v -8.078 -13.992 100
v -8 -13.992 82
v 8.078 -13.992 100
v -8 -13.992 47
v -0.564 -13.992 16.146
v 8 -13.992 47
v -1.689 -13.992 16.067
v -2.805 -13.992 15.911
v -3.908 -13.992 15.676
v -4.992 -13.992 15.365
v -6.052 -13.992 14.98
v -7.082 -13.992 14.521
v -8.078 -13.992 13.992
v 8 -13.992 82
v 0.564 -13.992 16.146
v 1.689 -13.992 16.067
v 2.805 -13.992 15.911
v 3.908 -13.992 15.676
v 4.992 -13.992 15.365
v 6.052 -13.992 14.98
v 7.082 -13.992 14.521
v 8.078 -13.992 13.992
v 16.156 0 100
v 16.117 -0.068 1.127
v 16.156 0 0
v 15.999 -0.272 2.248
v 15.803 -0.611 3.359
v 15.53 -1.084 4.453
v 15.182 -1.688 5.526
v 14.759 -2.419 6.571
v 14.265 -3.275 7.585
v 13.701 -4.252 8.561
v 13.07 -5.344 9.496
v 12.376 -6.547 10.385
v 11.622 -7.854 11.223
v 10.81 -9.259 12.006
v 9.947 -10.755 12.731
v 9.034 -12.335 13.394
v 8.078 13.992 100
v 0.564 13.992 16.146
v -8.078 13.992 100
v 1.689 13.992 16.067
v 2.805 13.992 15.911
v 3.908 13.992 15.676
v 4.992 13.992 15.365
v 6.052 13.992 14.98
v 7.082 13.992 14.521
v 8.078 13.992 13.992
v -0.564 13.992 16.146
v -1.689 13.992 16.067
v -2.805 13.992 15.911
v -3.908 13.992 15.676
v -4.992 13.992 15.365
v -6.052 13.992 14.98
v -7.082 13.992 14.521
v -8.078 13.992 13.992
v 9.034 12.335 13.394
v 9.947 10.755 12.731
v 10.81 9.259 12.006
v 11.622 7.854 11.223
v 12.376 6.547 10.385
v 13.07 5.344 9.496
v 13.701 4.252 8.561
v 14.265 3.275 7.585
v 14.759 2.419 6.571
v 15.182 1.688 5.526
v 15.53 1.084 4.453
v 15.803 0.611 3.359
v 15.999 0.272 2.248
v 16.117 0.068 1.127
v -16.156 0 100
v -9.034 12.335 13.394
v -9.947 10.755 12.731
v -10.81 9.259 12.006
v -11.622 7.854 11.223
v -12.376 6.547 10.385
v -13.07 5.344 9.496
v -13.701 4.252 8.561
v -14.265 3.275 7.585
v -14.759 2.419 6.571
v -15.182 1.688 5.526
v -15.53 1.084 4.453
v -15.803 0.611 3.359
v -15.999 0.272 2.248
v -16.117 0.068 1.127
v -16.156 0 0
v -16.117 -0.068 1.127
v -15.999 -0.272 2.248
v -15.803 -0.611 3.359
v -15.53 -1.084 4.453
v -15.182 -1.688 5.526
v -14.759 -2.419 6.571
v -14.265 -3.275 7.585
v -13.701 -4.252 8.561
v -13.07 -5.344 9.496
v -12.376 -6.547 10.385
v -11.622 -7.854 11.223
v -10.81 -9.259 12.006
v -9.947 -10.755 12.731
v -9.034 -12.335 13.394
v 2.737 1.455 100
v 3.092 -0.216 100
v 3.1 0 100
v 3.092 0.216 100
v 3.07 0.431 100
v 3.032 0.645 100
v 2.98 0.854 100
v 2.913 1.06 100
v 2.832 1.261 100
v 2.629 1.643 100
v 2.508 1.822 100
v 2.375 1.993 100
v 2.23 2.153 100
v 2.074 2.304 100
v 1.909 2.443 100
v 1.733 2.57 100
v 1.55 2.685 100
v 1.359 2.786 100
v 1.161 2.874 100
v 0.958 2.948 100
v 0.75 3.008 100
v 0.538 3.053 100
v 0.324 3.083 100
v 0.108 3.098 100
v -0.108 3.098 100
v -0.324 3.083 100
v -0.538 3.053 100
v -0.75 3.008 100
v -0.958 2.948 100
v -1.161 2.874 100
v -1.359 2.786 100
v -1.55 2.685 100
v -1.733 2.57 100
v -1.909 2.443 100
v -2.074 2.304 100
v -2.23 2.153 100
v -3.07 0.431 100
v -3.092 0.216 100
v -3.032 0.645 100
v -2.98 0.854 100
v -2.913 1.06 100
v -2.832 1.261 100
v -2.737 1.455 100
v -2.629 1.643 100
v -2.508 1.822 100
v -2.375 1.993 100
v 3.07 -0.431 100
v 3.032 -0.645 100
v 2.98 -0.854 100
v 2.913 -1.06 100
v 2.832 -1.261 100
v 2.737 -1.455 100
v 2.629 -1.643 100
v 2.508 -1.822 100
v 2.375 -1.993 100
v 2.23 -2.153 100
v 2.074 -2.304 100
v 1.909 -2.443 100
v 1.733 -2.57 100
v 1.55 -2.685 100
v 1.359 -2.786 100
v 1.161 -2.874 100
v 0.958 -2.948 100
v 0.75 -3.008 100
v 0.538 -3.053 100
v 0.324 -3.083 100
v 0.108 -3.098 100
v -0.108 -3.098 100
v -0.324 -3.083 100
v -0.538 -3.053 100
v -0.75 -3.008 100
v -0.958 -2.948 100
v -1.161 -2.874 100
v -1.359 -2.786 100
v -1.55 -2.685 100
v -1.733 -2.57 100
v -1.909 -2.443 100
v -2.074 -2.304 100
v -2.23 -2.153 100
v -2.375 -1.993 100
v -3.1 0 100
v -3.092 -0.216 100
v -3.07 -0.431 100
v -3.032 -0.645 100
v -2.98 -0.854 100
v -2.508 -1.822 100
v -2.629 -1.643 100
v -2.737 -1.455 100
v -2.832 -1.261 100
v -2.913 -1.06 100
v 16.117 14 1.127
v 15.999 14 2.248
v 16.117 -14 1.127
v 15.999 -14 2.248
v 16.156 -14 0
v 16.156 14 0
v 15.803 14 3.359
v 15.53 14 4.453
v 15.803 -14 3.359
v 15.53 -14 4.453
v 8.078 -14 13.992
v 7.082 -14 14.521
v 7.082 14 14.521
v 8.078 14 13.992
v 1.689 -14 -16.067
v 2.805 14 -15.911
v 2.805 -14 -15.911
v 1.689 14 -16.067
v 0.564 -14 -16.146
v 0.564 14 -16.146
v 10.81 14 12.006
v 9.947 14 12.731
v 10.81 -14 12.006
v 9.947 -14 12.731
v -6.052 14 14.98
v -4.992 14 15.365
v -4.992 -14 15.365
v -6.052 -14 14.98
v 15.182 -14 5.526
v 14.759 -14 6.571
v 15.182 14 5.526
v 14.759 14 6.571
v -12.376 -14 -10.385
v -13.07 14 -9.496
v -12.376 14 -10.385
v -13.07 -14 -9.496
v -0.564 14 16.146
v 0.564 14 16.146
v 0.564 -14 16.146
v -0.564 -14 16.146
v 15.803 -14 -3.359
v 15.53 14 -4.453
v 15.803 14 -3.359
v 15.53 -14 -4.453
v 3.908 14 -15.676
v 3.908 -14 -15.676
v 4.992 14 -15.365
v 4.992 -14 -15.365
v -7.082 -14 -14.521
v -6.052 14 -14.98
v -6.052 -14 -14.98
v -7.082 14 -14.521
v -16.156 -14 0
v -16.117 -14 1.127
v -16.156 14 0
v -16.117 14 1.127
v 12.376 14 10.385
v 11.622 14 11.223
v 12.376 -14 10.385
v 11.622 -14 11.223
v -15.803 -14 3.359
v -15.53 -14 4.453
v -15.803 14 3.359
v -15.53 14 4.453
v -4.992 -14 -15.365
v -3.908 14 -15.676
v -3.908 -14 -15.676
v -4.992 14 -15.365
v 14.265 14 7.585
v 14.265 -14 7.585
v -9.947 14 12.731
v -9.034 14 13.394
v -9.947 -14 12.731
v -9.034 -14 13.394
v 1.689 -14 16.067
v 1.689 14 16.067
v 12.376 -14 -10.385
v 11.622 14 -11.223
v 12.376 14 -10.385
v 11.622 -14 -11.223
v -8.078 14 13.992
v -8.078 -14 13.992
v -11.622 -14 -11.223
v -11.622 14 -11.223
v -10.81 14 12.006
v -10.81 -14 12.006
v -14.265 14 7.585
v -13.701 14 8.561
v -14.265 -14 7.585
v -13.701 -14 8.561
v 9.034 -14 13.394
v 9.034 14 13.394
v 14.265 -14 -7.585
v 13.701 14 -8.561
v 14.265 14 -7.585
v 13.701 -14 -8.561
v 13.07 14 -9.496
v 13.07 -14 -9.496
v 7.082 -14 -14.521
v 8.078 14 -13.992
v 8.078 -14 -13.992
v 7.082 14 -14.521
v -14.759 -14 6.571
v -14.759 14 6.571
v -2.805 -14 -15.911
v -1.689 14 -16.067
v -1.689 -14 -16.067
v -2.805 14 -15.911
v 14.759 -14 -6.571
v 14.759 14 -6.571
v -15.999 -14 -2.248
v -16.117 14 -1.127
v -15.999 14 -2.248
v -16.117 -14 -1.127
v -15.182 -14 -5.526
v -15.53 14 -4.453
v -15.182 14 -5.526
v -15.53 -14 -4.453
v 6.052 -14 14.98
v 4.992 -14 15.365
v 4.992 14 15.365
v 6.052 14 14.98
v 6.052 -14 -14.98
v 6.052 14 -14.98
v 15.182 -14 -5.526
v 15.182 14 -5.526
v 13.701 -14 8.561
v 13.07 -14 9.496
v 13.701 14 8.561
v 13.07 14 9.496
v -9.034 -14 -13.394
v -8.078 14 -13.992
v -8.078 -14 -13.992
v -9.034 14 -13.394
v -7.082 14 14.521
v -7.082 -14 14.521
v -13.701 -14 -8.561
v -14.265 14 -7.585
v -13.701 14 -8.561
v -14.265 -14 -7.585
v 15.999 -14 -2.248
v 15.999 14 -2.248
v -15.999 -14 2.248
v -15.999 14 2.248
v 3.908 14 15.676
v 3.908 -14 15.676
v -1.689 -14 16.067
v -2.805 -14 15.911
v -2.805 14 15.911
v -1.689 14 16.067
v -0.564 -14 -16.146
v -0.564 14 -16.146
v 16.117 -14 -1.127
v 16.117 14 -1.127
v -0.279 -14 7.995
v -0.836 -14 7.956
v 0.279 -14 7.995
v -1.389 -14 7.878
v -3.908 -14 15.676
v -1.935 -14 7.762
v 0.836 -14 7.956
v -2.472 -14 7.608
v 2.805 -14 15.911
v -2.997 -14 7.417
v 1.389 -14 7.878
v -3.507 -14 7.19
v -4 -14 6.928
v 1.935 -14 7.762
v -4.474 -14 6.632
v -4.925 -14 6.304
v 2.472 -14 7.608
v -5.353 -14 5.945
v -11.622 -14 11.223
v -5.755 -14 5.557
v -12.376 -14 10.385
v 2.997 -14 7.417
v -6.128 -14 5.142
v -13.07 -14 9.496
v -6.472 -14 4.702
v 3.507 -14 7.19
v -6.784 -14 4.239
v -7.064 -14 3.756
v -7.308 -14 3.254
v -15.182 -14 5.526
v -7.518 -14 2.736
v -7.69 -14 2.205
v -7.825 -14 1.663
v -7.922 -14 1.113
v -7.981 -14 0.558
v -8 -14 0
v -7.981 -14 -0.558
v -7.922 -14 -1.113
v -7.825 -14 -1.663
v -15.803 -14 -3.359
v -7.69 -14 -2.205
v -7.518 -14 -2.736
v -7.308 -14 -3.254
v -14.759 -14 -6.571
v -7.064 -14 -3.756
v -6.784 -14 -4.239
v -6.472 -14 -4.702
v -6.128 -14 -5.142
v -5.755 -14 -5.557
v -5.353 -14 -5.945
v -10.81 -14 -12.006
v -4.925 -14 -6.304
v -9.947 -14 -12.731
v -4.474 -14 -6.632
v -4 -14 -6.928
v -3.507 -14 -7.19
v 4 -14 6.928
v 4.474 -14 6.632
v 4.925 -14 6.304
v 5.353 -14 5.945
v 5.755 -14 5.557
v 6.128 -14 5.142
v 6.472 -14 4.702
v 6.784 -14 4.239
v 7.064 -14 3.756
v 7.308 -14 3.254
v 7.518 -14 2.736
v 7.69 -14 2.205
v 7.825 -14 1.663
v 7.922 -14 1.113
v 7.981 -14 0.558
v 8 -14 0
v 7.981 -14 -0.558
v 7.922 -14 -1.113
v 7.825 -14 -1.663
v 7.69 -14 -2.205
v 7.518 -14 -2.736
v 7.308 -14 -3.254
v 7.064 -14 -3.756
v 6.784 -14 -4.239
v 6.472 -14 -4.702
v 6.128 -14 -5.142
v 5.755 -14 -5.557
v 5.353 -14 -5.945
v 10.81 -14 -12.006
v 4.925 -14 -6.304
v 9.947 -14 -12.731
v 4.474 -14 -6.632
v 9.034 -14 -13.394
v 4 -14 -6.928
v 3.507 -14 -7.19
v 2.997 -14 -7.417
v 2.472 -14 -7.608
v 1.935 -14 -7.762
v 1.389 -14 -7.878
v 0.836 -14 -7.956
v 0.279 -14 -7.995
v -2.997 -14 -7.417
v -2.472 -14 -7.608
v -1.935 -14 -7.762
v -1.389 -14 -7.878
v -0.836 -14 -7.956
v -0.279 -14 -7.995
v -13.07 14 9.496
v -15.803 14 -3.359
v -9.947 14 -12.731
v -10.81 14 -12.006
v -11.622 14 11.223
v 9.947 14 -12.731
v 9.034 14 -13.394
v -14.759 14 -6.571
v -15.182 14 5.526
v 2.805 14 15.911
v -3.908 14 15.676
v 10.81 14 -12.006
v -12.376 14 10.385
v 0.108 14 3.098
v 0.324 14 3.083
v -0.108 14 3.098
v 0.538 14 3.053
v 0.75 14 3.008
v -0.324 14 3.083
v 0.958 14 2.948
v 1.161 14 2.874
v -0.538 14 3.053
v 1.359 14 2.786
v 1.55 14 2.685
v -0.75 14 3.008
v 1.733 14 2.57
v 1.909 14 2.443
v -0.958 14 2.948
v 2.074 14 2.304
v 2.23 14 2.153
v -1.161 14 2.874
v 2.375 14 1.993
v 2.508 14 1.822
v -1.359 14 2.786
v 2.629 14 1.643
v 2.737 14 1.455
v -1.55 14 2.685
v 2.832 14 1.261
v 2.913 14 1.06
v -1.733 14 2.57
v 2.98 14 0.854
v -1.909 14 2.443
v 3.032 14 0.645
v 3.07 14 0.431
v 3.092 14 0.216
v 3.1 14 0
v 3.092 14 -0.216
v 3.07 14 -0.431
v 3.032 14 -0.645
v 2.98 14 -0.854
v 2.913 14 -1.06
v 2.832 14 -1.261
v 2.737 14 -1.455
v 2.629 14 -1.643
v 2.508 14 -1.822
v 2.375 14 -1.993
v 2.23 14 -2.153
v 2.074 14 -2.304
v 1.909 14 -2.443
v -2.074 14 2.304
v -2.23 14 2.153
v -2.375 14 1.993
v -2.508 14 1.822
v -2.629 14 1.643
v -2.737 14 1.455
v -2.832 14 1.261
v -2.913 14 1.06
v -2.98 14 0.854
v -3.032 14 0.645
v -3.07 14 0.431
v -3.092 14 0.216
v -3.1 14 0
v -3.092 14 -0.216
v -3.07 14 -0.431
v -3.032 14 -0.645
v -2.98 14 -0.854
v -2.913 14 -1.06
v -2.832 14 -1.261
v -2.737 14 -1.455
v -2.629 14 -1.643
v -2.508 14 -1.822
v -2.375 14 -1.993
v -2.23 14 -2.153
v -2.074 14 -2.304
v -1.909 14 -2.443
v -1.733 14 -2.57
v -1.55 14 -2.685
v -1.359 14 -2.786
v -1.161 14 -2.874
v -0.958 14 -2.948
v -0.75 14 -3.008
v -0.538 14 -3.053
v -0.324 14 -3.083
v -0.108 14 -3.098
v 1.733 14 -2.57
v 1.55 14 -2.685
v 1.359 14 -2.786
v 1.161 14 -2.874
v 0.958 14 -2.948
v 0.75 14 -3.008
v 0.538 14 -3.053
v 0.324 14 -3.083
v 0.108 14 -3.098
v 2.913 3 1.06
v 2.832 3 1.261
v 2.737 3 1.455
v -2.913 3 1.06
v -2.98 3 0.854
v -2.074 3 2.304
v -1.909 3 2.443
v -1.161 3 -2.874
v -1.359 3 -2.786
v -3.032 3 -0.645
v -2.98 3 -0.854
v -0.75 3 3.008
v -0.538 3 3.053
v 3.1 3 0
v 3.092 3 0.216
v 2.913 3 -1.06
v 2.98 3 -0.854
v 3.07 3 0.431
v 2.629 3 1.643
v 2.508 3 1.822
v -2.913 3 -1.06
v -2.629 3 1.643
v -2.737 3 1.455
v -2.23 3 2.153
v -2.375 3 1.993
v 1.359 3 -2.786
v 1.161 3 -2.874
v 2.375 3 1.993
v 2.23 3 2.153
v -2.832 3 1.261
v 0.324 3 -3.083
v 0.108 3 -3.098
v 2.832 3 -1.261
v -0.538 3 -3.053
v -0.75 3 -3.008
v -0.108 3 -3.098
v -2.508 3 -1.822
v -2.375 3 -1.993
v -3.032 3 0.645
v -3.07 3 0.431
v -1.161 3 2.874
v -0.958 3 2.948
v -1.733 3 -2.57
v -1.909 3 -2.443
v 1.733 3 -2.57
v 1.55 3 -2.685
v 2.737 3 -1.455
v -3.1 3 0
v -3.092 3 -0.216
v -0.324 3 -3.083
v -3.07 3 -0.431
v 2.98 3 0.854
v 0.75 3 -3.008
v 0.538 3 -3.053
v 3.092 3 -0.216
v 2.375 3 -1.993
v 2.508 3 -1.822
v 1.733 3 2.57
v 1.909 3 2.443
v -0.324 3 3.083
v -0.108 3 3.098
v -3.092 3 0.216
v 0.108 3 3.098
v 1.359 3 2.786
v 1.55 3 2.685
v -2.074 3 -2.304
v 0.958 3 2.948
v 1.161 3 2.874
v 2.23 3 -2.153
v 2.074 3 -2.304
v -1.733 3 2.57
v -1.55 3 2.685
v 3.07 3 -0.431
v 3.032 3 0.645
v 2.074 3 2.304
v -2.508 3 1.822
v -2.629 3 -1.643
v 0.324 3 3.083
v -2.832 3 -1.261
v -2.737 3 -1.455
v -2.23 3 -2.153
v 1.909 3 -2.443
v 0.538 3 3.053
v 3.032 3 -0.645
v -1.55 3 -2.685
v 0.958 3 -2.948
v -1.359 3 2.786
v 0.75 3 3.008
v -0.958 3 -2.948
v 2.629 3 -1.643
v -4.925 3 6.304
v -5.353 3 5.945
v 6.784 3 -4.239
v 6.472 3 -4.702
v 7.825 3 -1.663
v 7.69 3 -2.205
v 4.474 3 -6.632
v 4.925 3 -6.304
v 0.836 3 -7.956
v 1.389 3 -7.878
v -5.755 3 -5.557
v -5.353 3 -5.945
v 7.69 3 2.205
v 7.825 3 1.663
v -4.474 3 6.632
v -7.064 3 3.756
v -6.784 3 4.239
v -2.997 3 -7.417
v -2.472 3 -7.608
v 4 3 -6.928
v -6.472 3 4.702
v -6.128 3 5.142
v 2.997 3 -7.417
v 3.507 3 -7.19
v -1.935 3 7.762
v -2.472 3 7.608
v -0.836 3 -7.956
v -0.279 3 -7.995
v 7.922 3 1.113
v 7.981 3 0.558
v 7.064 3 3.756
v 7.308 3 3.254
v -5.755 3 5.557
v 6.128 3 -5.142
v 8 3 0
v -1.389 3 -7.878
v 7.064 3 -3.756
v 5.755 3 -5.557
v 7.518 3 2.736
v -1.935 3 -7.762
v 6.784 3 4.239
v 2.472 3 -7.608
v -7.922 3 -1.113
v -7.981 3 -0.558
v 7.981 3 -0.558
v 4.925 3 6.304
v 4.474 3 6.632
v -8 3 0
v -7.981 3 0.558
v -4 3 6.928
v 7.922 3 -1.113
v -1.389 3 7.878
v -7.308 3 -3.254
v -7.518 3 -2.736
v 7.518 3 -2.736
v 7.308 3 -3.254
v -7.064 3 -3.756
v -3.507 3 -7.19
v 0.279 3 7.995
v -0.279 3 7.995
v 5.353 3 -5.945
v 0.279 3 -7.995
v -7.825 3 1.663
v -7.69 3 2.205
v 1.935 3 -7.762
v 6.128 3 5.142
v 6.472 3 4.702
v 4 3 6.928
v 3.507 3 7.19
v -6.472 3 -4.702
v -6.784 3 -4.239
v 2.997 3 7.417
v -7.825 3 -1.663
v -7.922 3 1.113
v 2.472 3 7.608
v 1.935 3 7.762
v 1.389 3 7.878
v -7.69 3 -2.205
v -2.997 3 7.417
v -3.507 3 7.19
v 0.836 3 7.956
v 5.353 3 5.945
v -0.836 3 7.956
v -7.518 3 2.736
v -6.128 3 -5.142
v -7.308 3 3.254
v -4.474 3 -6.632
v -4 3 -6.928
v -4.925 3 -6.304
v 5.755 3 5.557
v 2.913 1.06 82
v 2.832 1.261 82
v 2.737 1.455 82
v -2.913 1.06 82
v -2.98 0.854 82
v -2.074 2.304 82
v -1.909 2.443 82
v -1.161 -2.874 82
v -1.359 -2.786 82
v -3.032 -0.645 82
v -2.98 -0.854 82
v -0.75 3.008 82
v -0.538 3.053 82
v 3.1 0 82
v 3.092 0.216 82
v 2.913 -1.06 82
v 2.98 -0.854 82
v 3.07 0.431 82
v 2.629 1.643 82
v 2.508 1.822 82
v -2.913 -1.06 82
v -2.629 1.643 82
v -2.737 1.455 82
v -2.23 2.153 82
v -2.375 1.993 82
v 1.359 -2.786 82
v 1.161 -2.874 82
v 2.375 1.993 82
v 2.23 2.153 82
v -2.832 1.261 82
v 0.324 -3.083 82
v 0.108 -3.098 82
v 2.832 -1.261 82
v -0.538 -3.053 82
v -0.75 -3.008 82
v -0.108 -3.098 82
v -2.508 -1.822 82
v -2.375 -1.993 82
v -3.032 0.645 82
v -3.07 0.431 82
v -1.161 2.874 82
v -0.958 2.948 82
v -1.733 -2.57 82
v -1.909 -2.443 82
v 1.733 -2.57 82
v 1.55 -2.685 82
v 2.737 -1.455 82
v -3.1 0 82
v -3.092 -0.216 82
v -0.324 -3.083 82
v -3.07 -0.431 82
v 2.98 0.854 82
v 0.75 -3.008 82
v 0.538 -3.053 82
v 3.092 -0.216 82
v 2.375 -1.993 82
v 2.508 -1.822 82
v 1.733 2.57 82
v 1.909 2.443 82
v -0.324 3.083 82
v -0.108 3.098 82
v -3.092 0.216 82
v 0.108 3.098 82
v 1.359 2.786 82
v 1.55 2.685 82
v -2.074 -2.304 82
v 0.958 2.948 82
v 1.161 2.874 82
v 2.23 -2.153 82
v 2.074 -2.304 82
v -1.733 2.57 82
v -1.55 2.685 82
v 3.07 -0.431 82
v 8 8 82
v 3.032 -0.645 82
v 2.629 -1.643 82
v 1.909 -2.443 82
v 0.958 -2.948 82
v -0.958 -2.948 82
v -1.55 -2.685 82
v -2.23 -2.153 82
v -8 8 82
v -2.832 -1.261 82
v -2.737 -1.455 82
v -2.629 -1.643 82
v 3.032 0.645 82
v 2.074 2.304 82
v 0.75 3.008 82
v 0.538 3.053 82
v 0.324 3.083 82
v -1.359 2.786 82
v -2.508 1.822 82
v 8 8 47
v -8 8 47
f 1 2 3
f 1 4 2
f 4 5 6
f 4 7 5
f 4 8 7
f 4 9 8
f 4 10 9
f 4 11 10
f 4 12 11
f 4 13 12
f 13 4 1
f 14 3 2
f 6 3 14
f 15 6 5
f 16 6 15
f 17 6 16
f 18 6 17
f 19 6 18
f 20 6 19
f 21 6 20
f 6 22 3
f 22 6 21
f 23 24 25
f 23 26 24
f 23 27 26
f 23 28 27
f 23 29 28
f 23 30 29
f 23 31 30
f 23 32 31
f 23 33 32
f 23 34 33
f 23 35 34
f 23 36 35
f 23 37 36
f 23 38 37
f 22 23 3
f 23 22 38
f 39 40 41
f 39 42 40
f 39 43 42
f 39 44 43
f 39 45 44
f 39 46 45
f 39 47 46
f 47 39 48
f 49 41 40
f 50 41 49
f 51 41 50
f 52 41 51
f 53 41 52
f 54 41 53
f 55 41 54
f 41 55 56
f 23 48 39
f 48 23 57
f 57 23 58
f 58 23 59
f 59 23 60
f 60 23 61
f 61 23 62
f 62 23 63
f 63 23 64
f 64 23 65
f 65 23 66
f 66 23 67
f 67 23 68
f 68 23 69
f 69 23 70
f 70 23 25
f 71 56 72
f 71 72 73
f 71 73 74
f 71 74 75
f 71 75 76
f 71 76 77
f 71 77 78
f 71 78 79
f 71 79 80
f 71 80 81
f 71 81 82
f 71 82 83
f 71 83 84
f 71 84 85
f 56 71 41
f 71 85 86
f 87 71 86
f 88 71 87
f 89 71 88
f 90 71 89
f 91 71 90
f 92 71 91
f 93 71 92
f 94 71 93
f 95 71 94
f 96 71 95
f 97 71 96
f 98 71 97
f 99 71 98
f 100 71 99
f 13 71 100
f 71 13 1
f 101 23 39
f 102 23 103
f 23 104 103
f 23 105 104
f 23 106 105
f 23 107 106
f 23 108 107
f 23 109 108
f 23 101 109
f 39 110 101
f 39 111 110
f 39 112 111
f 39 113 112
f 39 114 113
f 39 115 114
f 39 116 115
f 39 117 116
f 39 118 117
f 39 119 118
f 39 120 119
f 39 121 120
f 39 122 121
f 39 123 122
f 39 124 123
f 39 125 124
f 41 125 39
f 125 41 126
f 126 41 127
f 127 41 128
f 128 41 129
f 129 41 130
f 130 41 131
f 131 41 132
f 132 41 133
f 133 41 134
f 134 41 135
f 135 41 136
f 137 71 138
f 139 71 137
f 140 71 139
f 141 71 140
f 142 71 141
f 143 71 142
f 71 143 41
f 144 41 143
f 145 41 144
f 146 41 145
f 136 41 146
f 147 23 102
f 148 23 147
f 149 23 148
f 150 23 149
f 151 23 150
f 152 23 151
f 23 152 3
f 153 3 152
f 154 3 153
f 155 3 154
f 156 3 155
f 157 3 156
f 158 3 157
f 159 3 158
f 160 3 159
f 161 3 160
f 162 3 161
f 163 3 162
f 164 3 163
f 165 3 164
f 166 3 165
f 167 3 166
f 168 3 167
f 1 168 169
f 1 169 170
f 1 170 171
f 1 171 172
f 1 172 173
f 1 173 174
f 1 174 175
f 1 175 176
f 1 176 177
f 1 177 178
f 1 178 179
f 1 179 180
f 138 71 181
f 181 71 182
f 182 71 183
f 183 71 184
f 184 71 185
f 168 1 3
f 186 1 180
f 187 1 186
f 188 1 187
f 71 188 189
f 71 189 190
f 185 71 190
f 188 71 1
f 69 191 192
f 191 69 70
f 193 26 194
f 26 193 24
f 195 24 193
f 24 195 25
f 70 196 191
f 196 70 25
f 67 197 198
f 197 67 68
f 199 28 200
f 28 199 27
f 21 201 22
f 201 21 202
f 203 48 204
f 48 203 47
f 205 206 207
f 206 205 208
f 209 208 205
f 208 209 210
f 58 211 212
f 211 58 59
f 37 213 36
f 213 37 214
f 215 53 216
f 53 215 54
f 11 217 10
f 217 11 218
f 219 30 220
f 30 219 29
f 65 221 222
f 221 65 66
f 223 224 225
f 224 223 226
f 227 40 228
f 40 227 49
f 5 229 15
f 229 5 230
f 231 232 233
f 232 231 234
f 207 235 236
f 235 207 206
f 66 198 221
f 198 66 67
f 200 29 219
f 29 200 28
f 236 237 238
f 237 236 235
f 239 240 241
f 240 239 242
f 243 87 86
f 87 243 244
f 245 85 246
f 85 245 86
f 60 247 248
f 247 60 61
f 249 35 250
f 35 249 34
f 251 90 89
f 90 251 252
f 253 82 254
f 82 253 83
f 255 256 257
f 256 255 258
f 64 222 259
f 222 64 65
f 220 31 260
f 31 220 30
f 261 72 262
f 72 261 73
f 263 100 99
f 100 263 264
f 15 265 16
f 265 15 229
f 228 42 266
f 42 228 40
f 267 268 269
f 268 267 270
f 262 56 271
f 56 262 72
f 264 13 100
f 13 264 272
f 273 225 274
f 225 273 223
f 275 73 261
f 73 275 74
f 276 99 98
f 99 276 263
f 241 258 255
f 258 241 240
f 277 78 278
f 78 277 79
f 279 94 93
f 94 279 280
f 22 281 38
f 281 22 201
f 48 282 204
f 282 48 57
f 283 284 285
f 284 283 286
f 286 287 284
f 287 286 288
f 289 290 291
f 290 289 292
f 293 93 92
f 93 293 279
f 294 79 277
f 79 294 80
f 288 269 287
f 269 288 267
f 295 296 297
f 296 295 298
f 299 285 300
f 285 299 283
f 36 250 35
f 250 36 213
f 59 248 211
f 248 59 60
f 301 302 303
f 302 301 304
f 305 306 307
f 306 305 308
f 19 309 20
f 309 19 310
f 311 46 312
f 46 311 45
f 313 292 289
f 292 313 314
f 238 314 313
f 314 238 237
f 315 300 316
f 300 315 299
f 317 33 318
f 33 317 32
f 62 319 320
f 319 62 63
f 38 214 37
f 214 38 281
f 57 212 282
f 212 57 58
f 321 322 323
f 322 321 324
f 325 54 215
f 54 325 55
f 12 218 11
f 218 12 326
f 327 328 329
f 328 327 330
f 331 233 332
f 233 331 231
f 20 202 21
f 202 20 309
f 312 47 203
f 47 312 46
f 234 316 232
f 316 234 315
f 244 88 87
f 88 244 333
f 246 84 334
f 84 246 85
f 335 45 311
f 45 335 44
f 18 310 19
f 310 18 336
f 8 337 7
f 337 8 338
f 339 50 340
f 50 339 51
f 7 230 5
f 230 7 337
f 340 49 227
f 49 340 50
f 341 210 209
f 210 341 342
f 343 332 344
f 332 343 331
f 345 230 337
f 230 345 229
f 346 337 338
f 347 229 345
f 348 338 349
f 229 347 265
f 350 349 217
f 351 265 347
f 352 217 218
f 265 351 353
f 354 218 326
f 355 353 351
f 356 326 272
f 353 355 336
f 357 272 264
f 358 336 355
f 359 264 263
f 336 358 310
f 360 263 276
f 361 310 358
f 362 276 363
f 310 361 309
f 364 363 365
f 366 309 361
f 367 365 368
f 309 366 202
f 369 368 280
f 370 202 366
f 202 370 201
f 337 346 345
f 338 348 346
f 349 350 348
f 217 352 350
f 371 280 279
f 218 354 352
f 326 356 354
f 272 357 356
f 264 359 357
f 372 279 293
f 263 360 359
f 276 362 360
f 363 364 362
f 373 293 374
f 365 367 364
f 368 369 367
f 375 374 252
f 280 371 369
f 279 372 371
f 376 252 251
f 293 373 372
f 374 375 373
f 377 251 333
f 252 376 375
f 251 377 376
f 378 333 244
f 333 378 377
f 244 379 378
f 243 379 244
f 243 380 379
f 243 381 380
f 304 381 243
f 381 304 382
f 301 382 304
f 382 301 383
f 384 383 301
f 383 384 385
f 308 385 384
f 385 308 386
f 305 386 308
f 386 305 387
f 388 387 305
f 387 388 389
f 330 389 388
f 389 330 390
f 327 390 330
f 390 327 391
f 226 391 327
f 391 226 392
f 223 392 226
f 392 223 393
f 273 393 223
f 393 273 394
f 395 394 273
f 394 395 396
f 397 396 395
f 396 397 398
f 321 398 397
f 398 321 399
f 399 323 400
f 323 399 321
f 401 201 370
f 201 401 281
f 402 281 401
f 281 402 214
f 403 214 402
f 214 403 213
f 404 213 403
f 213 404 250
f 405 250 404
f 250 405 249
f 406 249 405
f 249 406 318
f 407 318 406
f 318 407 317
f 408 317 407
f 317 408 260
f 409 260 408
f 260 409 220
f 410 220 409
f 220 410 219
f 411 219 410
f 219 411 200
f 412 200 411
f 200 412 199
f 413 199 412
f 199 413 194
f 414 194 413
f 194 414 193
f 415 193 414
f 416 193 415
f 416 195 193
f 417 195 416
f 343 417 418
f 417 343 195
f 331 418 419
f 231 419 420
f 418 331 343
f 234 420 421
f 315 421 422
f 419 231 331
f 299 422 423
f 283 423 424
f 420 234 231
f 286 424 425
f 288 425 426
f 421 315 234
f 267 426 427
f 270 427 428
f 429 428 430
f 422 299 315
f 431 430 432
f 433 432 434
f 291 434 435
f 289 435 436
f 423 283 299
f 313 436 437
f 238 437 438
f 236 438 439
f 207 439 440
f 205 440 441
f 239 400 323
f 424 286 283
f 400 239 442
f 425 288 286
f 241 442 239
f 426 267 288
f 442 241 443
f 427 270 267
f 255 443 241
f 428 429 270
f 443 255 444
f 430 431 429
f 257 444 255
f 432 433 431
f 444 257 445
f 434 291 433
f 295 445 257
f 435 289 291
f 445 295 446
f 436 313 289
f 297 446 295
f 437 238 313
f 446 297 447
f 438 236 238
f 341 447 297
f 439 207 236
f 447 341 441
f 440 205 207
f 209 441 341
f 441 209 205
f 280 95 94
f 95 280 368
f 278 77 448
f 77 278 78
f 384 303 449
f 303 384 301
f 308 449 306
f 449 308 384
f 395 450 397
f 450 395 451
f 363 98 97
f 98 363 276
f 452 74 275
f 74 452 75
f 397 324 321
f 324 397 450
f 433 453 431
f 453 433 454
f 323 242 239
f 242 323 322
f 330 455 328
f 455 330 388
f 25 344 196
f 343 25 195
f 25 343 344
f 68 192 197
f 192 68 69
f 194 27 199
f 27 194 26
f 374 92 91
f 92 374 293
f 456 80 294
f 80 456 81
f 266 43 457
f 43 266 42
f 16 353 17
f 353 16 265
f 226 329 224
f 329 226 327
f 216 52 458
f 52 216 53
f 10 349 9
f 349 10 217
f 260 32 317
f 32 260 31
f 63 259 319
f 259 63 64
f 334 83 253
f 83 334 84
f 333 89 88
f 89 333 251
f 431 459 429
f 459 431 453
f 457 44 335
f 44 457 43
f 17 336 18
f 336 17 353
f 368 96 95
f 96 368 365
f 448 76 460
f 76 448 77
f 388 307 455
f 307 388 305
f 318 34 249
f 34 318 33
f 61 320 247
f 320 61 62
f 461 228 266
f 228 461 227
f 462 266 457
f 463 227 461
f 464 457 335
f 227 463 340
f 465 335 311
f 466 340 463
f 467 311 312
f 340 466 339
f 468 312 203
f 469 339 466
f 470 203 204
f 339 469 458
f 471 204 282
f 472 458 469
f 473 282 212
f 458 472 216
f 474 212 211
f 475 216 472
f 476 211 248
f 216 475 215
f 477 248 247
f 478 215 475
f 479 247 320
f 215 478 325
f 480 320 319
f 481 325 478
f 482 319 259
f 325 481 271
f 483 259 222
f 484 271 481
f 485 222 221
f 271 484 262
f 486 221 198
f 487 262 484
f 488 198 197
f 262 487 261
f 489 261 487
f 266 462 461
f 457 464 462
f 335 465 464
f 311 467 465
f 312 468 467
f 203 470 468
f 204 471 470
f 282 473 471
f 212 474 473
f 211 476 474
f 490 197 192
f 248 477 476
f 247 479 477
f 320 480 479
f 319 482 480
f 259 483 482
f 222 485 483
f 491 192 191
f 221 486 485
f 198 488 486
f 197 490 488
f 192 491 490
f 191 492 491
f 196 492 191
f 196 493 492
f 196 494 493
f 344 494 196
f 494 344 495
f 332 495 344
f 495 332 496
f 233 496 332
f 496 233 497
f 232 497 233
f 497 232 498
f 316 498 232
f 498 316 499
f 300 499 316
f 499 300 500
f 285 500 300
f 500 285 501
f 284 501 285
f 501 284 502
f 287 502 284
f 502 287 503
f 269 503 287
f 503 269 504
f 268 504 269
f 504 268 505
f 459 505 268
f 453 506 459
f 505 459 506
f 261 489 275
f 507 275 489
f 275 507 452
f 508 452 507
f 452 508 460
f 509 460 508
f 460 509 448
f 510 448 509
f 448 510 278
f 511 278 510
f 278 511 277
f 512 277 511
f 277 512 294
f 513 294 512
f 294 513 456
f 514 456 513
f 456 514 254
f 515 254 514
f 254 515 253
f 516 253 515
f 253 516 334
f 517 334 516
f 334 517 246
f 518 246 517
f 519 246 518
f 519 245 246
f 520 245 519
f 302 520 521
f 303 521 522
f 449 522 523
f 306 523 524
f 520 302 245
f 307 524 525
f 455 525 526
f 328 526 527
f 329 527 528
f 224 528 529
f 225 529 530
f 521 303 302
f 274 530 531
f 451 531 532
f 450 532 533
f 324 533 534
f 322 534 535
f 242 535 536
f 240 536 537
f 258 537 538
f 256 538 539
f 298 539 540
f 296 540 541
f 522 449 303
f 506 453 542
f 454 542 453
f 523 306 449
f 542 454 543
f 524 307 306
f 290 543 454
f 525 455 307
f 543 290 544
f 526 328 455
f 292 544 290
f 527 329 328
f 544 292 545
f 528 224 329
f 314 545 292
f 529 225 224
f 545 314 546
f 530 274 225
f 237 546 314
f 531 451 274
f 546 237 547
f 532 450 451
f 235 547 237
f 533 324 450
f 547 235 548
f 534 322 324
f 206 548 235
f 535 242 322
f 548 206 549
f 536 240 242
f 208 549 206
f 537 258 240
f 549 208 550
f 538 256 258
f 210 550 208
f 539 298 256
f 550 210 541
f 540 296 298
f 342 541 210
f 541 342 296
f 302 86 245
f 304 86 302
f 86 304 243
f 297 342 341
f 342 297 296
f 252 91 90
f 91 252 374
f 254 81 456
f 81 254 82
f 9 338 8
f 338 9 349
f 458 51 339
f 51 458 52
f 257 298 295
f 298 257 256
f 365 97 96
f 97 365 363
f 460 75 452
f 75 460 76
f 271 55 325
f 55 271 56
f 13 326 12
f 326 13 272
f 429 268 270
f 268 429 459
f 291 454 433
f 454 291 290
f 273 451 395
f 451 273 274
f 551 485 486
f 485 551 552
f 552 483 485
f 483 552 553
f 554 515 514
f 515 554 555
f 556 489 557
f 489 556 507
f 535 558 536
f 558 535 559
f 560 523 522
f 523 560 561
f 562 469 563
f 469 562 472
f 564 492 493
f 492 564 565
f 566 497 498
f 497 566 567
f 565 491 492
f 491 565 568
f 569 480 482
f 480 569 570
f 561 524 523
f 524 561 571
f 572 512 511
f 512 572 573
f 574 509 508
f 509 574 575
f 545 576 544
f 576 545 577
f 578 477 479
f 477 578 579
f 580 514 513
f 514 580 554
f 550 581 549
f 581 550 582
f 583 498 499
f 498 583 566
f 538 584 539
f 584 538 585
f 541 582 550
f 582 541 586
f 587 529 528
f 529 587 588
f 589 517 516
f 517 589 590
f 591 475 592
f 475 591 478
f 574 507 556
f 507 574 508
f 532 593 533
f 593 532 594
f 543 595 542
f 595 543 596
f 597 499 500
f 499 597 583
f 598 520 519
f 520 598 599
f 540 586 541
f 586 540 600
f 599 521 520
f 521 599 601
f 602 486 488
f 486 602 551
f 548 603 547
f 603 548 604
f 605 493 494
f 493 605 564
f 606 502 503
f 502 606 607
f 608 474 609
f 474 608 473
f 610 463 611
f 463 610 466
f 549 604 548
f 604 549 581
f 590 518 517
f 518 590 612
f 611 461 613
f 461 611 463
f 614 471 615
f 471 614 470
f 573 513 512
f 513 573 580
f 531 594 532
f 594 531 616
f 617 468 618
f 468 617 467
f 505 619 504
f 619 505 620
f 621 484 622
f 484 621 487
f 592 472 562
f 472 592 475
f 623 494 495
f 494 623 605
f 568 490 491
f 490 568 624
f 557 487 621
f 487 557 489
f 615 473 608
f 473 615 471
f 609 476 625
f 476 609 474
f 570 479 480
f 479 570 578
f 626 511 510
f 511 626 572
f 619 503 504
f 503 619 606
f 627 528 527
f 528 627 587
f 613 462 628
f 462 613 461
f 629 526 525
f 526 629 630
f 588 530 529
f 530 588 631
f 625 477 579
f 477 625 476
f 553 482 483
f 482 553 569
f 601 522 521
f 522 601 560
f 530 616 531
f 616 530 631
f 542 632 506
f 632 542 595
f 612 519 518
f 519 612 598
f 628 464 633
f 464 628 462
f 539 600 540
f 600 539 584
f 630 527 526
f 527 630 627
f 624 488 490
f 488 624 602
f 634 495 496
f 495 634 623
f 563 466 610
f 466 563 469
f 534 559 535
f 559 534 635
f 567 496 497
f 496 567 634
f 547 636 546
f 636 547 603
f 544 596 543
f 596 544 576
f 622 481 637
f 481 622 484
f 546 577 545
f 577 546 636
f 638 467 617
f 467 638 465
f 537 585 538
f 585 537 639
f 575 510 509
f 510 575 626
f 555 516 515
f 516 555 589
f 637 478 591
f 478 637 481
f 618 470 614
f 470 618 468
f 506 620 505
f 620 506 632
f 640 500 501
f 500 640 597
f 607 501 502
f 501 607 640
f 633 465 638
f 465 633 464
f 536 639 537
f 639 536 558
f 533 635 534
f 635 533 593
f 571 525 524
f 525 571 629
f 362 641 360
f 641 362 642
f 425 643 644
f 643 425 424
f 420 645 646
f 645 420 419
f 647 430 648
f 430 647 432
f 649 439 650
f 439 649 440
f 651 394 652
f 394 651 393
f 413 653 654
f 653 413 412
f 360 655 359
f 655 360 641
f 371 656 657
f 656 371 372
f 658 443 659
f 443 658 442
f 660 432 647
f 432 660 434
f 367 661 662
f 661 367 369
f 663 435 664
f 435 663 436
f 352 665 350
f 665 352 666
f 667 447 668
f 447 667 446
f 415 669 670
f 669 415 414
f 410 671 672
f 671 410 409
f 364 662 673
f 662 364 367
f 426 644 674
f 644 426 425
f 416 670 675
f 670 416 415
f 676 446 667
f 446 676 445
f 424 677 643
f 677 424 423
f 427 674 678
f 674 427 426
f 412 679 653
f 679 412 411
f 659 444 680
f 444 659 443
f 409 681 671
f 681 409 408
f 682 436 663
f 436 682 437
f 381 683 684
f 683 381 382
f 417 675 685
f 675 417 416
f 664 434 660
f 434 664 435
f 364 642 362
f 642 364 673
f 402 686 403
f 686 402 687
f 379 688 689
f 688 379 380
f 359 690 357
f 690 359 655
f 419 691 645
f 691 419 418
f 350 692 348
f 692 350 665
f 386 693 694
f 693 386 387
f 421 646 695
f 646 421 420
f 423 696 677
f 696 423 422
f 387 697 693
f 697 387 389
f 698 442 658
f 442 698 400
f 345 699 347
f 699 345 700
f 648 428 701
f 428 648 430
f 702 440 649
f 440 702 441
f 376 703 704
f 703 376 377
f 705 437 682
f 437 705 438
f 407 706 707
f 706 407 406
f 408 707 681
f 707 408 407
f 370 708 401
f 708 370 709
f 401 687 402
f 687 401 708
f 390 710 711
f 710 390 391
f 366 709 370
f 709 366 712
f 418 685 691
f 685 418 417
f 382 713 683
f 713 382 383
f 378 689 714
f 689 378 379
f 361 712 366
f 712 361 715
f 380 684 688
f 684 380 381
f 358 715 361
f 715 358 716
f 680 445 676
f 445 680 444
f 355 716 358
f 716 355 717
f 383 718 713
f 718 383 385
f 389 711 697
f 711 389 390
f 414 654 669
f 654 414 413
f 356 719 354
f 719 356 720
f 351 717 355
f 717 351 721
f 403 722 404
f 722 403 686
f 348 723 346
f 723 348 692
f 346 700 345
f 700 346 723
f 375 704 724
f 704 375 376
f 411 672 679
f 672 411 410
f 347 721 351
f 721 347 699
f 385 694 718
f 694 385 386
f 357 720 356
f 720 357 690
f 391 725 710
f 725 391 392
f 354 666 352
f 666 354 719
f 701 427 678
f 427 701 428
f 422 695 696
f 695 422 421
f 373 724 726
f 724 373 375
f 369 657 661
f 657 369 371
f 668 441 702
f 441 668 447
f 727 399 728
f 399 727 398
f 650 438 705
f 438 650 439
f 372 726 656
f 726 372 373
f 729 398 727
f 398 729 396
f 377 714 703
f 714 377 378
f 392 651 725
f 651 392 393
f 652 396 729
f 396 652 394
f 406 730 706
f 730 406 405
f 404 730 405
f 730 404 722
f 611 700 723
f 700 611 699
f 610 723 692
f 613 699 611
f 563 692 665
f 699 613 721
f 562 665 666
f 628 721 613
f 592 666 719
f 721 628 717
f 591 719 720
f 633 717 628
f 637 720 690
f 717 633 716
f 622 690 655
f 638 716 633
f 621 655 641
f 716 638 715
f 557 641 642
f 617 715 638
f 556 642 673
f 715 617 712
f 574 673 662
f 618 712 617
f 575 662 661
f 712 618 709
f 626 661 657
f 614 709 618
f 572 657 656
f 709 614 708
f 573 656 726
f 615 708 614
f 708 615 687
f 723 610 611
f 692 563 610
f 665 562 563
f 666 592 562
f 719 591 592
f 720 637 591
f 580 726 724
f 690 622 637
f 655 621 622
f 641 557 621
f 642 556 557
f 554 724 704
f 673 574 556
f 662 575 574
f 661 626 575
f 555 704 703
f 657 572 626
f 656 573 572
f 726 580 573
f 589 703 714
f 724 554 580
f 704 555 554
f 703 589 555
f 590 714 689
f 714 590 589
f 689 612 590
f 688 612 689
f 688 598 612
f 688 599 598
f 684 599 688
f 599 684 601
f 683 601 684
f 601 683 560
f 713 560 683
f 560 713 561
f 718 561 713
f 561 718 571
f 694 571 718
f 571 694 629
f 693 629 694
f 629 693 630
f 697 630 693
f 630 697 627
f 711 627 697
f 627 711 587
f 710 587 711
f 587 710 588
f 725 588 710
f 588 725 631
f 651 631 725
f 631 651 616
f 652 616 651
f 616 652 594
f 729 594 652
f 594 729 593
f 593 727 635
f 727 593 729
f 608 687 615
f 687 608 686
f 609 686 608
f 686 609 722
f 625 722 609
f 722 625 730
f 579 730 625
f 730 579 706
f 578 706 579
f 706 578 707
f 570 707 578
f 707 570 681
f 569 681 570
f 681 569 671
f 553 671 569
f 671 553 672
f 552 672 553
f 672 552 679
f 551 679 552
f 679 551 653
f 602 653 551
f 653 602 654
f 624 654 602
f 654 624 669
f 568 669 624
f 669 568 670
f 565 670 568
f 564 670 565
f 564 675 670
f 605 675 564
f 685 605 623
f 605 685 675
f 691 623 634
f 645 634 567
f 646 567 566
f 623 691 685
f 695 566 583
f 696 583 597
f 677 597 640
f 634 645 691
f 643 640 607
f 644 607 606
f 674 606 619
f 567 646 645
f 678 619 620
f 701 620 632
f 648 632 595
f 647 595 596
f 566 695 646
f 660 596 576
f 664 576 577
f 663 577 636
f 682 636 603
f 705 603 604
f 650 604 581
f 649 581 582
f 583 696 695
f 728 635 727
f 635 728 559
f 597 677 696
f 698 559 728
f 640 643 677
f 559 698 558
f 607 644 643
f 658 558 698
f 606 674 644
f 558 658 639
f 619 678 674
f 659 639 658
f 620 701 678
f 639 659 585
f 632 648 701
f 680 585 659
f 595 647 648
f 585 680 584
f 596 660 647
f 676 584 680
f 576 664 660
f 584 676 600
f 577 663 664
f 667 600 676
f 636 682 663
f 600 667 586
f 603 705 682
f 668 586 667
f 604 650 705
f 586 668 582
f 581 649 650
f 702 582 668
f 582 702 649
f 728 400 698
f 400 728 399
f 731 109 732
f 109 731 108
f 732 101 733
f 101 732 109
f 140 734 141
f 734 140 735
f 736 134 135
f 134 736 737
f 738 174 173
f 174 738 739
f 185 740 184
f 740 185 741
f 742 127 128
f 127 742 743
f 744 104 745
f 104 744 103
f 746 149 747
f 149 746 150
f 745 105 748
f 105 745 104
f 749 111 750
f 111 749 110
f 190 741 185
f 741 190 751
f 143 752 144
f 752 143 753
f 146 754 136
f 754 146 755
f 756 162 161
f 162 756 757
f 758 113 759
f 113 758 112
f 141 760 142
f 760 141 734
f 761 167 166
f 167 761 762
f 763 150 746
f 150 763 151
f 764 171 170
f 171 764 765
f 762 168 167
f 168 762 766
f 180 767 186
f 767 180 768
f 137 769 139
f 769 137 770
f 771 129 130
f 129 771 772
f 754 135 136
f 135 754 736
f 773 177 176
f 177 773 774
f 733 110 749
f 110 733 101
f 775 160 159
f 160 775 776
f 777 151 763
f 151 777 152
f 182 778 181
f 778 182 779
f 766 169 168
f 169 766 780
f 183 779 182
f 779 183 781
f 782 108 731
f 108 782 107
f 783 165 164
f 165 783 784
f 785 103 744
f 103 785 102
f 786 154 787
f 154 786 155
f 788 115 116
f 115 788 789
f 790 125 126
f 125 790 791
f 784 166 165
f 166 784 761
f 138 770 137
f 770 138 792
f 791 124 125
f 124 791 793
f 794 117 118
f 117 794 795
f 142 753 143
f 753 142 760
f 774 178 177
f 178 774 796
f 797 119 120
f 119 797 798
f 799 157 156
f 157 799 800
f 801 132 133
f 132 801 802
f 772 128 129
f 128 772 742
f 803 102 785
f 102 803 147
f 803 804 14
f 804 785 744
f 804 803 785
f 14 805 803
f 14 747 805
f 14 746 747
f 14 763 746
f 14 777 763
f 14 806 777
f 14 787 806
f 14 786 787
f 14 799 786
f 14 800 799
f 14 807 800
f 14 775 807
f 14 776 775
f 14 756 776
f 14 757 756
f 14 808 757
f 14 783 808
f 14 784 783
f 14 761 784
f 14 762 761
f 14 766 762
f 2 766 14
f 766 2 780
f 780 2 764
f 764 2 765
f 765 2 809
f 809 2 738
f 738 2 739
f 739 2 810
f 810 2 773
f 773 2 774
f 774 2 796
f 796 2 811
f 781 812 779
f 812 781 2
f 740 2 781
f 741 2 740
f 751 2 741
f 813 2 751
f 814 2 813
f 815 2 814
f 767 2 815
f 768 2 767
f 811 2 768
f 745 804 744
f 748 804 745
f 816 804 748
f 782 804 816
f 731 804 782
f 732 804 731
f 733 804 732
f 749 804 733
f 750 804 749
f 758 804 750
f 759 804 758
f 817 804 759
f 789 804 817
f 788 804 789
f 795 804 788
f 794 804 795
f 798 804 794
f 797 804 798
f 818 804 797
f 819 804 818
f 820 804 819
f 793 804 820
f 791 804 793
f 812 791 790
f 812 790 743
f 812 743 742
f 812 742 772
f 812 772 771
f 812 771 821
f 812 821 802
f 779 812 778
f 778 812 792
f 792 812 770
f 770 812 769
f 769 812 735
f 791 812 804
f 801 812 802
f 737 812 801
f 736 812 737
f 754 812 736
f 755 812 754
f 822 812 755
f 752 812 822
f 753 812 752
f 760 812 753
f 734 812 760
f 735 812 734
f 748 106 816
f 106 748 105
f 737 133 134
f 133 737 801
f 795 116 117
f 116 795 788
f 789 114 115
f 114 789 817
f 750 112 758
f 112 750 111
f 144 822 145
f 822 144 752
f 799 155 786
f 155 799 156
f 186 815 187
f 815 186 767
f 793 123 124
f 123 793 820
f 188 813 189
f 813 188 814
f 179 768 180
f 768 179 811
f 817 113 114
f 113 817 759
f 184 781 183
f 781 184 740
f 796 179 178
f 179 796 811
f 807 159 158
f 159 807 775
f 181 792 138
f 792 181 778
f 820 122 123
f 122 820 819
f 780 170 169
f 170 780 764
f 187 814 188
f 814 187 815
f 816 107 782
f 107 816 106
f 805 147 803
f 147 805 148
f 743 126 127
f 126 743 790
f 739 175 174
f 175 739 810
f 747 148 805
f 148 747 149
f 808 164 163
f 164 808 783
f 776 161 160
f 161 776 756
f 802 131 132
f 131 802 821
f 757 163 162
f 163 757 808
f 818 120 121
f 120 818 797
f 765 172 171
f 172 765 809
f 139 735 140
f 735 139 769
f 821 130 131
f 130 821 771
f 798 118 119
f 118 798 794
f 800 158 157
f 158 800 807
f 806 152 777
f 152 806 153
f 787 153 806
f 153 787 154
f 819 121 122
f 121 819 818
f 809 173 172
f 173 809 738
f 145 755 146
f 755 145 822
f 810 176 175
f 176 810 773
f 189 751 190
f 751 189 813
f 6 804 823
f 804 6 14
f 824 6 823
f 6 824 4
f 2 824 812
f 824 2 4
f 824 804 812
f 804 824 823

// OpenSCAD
$fn = 90;

diameter = 28;
difference(){
	union(){
		cylinder(d=diameter*1.154, h=100, $fn=6);
		rotate([90, 0, 0])
			cylinder(d=diameter*1.154, h=diameter, center=true);
	}
	translate([0, 0, 100-18])
		#cylinder(d=6.2, h=18);
	translate([0, -3, 100+35/2-18-35])
		#cube([16, 22, 35], center=true);
	
	rotate([90, 0, 0]){
		#cylinder(d=6.2, h=diameter, center=true);
		translate([0, 0, 5.5])
			#cylinder(d=16, h=diameter-11, center=true);
	}
	
	//cylinder([diameter, diameter-11, 0], center=true);
}
